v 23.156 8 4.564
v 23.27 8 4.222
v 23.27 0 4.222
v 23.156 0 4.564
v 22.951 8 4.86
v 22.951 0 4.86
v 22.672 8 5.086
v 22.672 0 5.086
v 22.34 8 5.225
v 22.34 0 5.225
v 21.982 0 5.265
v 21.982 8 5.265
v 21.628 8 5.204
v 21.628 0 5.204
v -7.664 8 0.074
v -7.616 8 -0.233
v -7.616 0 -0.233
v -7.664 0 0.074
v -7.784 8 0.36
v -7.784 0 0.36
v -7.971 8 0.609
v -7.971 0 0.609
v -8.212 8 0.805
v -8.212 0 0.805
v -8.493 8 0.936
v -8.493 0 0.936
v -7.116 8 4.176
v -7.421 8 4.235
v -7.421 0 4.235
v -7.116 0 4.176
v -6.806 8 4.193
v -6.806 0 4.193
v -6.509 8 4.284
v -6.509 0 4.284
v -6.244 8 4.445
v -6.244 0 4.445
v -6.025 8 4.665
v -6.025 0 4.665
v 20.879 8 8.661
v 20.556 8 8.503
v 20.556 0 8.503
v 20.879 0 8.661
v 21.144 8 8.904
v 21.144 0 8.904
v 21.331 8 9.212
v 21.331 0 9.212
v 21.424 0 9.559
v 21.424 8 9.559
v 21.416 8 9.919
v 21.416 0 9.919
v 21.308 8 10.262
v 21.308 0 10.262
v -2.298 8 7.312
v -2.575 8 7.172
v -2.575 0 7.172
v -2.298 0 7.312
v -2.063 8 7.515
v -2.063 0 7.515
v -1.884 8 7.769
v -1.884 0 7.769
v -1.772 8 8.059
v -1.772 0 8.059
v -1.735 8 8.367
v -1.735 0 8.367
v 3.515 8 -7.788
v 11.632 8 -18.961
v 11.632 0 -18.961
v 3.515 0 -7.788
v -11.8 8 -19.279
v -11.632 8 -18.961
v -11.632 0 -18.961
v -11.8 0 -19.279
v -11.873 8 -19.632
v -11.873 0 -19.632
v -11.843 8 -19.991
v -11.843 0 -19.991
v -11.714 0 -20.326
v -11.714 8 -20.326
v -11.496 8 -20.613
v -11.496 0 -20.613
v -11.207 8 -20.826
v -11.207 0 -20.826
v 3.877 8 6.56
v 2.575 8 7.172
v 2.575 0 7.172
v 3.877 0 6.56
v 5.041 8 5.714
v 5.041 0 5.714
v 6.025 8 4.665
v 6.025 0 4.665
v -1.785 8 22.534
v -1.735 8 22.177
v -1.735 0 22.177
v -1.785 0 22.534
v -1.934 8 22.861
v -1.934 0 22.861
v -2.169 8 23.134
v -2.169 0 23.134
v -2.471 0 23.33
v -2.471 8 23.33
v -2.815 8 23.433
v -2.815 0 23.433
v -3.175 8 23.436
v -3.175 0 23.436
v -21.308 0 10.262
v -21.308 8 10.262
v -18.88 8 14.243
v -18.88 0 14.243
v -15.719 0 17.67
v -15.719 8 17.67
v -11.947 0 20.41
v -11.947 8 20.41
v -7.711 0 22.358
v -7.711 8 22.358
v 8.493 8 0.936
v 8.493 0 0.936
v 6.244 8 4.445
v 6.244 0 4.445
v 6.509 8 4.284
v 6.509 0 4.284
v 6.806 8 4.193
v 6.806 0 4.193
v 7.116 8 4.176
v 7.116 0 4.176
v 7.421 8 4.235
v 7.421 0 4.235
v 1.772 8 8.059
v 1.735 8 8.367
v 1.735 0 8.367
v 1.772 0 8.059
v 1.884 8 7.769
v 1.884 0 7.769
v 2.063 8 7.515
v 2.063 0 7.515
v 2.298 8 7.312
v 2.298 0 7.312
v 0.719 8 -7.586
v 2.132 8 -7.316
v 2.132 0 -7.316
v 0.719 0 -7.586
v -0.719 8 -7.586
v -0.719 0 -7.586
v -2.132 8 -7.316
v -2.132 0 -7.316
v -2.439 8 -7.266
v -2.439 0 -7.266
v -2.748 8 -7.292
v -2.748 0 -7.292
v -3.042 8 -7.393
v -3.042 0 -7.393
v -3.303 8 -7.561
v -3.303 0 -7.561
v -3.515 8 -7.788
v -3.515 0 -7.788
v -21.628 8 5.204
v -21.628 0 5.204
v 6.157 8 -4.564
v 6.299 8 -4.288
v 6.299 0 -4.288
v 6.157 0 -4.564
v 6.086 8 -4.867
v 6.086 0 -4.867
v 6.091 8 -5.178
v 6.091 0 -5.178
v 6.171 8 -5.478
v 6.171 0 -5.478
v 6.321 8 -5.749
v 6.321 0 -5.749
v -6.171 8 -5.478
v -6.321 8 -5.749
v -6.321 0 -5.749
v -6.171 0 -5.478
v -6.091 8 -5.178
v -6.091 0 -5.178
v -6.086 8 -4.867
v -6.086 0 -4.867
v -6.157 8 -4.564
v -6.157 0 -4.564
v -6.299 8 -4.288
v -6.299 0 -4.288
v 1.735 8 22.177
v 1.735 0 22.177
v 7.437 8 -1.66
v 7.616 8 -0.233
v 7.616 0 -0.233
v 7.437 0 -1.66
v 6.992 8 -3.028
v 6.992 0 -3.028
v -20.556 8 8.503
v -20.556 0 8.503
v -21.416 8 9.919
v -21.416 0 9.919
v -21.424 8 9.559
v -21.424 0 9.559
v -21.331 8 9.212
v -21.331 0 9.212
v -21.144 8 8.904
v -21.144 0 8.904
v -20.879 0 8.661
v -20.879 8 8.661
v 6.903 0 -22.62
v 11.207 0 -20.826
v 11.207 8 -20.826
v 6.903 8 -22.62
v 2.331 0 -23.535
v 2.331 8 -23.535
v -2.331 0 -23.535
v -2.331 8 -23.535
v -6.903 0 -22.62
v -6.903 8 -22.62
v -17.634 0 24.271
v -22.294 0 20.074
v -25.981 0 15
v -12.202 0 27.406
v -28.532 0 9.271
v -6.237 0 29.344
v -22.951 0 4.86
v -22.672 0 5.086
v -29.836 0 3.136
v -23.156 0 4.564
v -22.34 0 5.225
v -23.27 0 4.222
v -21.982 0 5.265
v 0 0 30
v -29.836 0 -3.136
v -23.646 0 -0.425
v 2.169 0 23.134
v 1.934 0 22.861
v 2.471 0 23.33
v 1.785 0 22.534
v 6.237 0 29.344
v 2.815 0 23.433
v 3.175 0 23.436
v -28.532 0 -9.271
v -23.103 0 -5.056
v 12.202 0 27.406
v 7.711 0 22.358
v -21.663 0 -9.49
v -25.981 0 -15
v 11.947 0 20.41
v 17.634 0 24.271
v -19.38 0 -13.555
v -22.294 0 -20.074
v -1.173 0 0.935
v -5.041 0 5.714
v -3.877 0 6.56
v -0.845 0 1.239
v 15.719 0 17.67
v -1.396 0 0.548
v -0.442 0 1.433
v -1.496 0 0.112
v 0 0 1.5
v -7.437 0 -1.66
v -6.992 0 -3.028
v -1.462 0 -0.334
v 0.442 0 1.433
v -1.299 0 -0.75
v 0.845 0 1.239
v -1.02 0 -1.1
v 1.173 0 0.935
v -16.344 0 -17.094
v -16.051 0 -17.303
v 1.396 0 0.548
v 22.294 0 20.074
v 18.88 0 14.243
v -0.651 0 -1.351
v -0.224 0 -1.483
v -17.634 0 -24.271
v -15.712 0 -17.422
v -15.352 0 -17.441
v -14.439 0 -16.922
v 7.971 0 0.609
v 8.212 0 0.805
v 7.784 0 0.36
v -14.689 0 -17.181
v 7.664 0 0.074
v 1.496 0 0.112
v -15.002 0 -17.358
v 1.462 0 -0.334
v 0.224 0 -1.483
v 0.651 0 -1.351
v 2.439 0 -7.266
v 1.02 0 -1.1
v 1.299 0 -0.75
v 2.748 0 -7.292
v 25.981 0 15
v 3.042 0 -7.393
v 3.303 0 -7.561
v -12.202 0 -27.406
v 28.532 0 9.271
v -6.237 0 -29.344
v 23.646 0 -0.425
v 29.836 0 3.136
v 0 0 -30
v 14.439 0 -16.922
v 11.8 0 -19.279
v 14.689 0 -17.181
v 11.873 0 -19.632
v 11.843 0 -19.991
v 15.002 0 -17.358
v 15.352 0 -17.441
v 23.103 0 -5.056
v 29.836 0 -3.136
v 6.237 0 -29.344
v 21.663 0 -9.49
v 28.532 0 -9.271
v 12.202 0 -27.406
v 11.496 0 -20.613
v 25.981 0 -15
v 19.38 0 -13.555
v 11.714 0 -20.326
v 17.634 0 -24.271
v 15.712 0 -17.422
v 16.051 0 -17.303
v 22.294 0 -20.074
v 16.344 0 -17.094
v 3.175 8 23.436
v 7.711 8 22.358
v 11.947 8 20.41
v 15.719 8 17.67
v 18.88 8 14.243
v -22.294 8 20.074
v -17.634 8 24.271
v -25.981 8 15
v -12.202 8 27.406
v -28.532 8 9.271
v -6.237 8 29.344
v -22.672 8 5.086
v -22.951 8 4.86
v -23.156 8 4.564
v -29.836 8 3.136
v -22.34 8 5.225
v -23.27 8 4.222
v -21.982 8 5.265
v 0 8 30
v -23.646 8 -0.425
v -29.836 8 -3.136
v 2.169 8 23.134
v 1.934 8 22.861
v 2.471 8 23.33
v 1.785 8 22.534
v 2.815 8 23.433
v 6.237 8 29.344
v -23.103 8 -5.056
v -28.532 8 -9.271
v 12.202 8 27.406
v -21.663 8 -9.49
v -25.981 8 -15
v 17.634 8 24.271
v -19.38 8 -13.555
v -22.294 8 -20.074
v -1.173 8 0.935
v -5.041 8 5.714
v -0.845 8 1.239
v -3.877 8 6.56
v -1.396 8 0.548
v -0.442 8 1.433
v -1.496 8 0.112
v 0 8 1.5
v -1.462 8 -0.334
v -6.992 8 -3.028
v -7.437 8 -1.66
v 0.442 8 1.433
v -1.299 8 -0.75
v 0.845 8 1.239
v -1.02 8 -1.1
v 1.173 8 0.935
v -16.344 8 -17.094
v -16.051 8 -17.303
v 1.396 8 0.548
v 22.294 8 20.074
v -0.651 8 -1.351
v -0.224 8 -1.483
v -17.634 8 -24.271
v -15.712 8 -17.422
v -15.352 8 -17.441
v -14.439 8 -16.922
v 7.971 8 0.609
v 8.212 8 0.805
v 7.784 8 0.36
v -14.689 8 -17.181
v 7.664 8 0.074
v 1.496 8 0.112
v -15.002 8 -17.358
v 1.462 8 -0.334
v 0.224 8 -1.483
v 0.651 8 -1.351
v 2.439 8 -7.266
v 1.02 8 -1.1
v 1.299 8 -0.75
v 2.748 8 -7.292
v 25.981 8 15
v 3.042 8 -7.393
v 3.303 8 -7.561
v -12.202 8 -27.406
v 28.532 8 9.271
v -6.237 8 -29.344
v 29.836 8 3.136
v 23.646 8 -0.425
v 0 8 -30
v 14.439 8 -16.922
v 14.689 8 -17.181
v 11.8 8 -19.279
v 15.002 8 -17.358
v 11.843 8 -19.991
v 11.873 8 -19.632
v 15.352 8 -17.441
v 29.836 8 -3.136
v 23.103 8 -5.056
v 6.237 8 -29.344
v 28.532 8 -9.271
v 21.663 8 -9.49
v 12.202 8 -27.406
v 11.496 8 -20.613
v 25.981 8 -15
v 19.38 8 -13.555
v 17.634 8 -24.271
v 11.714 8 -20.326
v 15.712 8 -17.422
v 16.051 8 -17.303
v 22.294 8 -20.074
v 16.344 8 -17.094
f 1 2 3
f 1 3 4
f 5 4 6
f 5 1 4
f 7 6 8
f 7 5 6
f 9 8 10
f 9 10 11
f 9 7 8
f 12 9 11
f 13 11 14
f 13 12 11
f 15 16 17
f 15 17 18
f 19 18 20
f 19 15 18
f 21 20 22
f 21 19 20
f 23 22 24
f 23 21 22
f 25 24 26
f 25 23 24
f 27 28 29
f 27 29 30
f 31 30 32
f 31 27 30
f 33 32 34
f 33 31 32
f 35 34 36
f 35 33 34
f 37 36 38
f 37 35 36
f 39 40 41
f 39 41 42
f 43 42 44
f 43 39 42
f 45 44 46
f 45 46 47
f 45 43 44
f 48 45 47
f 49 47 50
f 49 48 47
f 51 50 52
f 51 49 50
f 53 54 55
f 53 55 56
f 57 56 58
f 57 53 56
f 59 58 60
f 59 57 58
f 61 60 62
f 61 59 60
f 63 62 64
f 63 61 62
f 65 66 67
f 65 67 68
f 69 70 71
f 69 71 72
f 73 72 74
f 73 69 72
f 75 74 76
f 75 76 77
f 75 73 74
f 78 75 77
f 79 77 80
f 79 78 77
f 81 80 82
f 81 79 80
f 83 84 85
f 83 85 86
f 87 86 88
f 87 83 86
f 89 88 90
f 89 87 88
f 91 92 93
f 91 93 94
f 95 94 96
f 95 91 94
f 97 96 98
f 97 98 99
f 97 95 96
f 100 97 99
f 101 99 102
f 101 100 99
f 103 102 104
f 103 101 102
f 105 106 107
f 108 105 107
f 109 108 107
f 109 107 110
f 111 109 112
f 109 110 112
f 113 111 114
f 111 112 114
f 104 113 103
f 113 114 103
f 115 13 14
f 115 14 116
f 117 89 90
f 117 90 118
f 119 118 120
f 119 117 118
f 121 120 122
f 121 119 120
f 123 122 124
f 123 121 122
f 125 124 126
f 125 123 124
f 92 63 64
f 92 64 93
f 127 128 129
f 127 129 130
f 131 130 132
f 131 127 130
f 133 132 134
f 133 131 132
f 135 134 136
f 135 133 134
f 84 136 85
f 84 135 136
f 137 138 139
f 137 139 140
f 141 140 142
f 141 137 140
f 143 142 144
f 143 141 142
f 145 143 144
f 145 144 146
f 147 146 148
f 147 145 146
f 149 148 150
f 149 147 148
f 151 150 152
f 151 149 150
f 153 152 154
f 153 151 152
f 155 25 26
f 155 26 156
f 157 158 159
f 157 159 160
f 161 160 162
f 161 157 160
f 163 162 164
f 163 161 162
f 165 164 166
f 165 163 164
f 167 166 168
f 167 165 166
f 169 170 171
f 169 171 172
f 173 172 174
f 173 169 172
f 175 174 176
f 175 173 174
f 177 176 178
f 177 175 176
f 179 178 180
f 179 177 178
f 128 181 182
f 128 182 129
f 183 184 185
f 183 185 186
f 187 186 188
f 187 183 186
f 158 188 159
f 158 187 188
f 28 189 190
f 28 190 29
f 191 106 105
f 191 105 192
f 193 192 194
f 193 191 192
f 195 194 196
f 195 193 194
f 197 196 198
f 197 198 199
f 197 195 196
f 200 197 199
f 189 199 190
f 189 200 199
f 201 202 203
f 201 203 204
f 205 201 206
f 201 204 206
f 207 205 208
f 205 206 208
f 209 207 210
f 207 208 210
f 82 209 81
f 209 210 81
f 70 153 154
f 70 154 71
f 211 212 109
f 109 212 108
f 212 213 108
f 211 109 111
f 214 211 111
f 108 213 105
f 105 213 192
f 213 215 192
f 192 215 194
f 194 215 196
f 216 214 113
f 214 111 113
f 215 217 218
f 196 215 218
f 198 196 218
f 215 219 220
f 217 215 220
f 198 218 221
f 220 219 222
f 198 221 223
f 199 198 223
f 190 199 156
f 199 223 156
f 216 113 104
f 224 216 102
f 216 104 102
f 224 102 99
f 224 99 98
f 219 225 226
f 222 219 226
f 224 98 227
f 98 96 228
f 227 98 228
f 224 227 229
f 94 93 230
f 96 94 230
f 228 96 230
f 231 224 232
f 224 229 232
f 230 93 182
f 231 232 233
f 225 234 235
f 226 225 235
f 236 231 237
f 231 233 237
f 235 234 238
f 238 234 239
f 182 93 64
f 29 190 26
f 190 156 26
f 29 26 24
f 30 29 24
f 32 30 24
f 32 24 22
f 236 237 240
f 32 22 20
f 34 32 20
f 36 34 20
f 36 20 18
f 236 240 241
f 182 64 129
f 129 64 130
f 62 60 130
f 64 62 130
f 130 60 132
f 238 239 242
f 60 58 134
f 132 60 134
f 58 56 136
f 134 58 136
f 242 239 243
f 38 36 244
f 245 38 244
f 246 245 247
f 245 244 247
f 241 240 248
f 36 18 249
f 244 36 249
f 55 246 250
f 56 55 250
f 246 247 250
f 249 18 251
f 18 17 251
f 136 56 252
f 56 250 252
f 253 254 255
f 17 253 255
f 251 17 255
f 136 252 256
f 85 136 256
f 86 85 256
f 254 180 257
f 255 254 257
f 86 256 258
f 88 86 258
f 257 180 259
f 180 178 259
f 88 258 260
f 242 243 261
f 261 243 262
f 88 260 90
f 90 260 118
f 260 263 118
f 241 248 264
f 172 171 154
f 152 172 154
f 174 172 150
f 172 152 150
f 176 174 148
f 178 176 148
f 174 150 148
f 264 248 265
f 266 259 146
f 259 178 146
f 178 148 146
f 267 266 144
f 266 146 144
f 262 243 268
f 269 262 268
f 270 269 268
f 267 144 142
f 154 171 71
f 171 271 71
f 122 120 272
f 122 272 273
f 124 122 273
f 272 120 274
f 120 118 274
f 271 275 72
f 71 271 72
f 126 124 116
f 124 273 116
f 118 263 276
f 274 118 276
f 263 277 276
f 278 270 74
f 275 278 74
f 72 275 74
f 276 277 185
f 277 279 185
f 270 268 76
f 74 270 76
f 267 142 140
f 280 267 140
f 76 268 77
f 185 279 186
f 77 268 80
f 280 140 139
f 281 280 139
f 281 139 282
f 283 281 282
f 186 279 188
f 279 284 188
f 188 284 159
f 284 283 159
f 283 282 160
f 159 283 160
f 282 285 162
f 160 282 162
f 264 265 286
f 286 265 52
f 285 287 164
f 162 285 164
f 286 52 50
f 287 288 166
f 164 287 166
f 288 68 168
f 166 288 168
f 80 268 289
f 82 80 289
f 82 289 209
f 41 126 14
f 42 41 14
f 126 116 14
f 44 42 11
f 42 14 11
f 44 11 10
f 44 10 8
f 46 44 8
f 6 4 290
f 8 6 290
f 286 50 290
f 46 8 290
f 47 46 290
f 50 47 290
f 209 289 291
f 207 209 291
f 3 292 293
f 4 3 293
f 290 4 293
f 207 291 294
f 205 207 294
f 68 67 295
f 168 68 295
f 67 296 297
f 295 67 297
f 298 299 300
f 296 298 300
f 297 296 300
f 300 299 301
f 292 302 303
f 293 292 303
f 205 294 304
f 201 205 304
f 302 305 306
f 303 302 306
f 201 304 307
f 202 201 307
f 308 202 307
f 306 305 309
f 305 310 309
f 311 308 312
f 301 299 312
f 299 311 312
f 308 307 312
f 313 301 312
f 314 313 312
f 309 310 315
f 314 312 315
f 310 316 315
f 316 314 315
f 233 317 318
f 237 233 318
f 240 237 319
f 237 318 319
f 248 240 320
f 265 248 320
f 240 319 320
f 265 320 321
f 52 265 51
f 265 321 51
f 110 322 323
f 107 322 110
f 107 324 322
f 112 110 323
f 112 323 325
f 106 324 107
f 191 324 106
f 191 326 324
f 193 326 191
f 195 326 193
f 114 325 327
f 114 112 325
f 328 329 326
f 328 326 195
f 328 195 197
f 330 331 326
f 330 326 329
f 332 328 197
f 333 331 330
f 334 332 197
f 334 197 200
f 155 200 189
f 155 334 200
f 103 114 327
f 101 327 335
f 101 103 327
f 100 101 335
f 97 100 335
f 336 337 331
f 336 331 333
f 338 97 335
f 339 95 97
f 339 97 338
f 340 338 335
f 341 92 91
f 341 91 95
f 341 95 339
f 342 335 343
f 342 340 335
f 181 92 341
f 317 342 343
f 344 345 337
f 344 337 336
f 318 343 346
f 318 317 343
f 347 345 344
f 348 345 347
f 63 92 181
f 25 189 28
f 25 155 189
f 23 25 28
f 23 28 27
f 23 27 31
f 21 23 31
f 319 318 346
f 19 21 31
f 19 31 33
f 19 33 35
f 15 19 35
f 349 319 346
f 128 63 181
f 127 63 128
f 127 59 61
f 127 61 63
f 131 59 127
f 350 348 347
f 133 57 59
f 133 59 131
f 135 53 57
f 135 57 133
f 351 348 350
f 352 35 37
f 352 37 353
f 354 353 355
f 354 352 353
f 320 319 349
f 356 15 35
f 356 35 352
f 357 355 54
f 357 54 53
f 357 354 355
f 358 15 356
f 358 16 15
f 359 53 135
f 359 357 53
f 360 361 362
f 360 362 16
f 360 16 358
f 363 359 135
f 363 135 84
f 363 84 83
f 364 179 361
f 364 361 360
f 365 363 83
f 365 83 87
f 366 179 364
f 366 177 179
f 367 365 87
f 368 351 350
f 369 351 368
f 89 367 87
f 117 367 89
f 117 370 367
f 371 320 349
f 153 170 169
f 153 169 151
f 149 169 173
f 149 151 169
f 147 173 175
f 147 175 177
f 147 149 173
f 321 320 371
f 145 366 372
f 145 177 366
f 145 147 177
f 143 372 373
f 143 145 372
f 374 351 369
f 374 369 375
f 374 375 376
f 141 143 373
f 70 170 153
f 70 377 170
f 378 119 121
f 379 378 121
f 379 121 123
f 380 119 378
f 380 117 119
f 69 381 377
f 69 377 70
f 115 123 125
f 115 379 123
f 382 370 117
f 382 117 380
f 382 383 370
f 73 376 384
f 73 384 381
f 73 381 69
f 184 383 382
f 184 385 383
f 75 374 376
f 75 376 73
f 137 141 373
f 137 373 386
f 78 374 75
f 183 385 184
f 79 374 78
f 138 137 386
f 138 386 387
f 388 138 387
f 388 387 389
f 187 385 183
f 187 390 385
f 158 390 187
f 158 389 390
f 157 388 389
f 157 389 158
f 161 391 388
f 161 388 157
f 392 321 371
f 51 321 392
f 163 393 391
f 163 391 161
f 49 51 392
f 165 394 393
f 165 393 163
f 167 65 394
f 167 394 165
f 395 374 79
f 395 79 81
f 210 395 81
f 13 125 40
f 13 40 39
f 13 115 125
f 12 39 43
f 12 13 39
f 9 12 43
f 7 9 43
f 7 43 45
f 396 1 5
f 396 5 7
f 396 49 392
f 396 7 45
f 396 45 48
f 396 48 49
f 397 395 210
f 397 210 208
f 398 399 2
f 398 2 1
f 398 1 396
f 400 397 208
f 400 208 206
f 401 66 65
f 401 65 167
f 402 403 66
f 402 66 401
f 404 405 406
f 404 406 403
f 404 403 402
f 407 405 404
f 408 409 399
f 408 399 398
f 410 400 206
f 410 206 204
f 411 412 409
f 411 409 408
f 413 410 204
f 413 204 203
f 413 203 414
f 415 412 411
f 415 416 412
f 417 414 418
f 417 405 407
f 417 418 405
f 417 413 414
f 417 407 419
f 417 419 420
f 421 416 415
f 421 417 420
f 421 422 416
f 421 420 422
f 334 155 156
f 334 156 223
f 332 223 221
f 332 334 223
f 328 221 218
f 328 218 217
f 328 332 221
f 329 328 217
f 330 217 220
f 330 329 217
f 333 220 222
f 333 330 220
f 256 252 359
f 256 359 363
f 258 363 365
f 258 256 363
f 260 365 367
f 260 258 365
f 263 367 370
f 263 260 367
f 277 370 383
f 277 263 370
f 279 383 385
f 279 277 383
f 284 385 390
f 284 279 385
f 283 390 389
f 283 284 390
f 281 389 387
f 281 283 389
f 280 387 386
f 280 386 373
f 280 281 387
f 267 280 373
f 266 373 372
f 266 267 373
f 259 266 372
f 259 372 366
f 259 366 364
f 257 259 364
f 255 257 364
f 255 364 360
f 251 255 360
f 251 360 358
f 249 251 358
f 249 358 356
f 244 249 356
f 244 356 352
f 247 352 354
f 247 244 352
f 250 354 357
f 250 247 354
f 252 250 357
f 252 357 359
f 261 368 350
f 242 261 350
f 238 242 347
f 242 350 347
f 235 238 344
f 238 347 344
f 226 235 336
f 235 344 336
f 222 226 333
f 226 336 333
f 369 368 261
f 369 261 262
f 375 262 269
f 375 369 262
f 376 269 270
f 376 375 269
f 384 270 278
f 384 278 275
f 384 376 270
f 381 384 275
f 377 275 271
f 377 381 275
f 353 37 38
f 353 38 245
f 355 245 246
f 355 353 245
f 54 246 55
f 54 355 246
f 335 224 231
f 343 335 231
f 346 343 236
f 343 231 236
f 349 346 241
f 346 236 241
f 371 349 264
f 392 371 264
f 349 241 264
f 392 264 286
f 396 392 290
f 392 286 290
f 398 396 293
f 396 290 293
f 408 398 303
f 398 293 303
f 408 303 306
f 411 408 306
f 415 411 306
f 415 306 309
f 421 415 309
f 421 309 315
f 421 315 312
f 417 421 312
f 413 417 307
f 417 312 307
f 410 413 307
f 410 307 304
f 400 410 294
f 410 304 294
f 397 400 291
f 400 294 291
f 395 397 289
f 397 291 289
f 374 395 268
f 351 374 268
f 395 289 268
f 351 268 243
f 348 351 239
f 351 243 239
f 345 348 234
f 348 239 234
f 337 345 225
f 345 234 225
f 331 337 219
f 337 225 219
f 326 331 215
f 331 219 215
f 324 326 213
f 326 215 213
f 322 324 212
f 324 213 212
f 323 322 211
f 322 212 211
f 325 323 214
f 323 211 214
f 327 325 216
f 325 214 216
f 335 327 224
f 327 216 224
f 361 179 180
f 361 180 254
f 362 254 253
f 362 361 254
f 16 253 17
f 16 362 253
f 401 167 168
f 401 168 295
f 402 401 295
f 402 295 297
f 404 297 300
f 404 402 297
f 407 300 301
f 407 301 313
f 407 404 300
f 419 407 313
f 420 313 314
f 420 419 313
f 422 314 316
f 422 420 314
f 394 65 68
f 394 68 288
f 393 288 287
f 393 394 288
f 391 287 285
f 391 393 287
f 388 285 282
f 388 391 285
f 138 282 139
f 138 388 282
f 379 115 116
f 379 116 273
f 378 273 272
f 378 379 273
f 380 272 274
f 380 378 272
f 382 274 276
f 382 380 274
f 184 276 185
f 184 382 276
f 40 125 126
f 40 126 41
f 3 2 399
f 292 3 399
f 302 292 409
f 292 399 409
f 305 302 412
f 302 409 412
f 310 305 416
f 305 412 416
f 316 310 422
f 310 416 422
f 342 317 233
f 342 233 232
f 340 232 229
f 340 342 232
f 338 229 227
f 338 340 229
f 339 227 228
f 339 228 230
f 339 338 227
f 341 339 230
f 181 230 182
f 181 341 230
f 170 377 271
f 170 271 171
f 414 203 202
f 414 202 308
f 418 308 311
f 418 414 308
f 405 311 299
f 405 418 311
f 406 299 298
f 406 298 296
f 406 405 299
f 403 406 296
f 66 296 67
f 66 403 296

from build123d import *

# Parameters (mm, degrees)
SKETCH1_R           = 30
SKETCH1_R_2         = 1.5
BOSS_EXTRUDE1_DEPTH = 8
SKETCH2_R           = 23.65
SKETCH2_R_2         = 7.62
CUT_EXTRUDE1_DEPTH  = 8
BOSS_EXTRUDE2_DEPTH = 8
CIRPATTERN1_COUNT   = 5


with BuildPart() as part:
    # Sketch1 → Boss-Extrude1 (new body)
    with BuildSketch(Plane(origin=(0, 0, 0), x_dir=(1, 0, 0), z_dir=(0, 1, 0))):
        with Locations(Location((0, 0, 0), (0, 0, 270))):
            Circle(SKETCH1_R)
        with Locations(Location((0, 0, 0), (0, 0, 270))):
            Circle(SKETCH1_R_2, mode=Mode.SUBTRACT)
    extrude(amount=BOSS_EXTRUDE1_DEPTH)

    # Sketch2 → Cut-Extrude1 (cut)
    with BuildSketch(Plane(origin=(0, 8, 0), x_dir=(1, 0, 0), z_dir=(0, 1, 0))):
        with Locations(Location((0, 0, 0), (0, 0, 270))):
            Circle(SKETCH2_R)
        with Locations(Location((0, 0, 0), (0, 0, 270))):
            Circle(SKETCH2_R_2, mode=Mode.SUBTRACT)
    extrude(amount=-CUT_EXTRUDE1_DEPTH, mode=Mode.SUBTRACT)


with BuildPart() as cut_extrude1_piece_1:
    # of the separate pieces the step leaves, piece 1, a body of its own (cut_extrude1_pieces)
    add(part.part.solids().sort_by_distance((0, 0, 30))[0])



with BuildPart() as cut_extrude1_piece_2:
    # of the separate pieces the step leaves, piece 2, a body of its own (cut_extrude1_pieces)
    add(part.part.solids().sort_by_distance((0, 0, 7.62))[0])


with BuildPart() as cut_extrude1_piece_1_1:
    add(cut_extrude1_piece_1.part)

    add(cut_extrude1_piece_2.part)  # Boss-Extrude2 merges Cut-Extrude1 piece 2
    # Sketch3 → Boss-Extrude2 (add)
    with BuildSketch(Plane(origin=(0, 8, 0), x_dir=(1, 0, 0), z_dir=(0, 1, 0))):
        with BuildLine():
            Line((-1.734503171, -8.366902694), (-1.734503171, -22.177406537))
            ThreePointArc((-1.734503171, -22.177406537), (-2.16892881, -23.133814131), (-3.175, -23.435909946))
            ThreePointArc((-3.175, -23.435909946), (0, -23.65), (3.175, -23.435909946))
            ThreePointArc((3.175, -23.435909946), (2.16892881, -23.133814131), (1.734503171, -22.177406537))
            Line((1.734503171, -22.177406537), (1.734503171, -8.366902694))
            ThreePointArc((1.734503171, -8.366902694), (1.965753269, -7.636219014), (2.575288432, -7.171630881))
            ThreePointArc((2.575288432, -7.171630881), (0, -7.62), (-2.575288432, -7.171630881))
            ThreePointArc((-2.575288432, -7.171630881), (-1.965753269, -7.636219014), (-1.734503171, -8.366902694))
        make_face()
    boss_extrude2 = extrude(amount=-BOSS_EXTRUDE2_DEPTH)

    # CirPattern1: Boss-Extrude2 ×5 about axis
    cirpattern1_axis = Axis((0, 0, 0), (0, 1, 0))
    for i in range(1, CIRPATTERN1_COUNT):
        add(boss_extrude2.rotate(cirpattern1_axis, i * 360 / CIRPATTERN1_COUNT))


solid = cut_extrude1_piece_1_1.part
